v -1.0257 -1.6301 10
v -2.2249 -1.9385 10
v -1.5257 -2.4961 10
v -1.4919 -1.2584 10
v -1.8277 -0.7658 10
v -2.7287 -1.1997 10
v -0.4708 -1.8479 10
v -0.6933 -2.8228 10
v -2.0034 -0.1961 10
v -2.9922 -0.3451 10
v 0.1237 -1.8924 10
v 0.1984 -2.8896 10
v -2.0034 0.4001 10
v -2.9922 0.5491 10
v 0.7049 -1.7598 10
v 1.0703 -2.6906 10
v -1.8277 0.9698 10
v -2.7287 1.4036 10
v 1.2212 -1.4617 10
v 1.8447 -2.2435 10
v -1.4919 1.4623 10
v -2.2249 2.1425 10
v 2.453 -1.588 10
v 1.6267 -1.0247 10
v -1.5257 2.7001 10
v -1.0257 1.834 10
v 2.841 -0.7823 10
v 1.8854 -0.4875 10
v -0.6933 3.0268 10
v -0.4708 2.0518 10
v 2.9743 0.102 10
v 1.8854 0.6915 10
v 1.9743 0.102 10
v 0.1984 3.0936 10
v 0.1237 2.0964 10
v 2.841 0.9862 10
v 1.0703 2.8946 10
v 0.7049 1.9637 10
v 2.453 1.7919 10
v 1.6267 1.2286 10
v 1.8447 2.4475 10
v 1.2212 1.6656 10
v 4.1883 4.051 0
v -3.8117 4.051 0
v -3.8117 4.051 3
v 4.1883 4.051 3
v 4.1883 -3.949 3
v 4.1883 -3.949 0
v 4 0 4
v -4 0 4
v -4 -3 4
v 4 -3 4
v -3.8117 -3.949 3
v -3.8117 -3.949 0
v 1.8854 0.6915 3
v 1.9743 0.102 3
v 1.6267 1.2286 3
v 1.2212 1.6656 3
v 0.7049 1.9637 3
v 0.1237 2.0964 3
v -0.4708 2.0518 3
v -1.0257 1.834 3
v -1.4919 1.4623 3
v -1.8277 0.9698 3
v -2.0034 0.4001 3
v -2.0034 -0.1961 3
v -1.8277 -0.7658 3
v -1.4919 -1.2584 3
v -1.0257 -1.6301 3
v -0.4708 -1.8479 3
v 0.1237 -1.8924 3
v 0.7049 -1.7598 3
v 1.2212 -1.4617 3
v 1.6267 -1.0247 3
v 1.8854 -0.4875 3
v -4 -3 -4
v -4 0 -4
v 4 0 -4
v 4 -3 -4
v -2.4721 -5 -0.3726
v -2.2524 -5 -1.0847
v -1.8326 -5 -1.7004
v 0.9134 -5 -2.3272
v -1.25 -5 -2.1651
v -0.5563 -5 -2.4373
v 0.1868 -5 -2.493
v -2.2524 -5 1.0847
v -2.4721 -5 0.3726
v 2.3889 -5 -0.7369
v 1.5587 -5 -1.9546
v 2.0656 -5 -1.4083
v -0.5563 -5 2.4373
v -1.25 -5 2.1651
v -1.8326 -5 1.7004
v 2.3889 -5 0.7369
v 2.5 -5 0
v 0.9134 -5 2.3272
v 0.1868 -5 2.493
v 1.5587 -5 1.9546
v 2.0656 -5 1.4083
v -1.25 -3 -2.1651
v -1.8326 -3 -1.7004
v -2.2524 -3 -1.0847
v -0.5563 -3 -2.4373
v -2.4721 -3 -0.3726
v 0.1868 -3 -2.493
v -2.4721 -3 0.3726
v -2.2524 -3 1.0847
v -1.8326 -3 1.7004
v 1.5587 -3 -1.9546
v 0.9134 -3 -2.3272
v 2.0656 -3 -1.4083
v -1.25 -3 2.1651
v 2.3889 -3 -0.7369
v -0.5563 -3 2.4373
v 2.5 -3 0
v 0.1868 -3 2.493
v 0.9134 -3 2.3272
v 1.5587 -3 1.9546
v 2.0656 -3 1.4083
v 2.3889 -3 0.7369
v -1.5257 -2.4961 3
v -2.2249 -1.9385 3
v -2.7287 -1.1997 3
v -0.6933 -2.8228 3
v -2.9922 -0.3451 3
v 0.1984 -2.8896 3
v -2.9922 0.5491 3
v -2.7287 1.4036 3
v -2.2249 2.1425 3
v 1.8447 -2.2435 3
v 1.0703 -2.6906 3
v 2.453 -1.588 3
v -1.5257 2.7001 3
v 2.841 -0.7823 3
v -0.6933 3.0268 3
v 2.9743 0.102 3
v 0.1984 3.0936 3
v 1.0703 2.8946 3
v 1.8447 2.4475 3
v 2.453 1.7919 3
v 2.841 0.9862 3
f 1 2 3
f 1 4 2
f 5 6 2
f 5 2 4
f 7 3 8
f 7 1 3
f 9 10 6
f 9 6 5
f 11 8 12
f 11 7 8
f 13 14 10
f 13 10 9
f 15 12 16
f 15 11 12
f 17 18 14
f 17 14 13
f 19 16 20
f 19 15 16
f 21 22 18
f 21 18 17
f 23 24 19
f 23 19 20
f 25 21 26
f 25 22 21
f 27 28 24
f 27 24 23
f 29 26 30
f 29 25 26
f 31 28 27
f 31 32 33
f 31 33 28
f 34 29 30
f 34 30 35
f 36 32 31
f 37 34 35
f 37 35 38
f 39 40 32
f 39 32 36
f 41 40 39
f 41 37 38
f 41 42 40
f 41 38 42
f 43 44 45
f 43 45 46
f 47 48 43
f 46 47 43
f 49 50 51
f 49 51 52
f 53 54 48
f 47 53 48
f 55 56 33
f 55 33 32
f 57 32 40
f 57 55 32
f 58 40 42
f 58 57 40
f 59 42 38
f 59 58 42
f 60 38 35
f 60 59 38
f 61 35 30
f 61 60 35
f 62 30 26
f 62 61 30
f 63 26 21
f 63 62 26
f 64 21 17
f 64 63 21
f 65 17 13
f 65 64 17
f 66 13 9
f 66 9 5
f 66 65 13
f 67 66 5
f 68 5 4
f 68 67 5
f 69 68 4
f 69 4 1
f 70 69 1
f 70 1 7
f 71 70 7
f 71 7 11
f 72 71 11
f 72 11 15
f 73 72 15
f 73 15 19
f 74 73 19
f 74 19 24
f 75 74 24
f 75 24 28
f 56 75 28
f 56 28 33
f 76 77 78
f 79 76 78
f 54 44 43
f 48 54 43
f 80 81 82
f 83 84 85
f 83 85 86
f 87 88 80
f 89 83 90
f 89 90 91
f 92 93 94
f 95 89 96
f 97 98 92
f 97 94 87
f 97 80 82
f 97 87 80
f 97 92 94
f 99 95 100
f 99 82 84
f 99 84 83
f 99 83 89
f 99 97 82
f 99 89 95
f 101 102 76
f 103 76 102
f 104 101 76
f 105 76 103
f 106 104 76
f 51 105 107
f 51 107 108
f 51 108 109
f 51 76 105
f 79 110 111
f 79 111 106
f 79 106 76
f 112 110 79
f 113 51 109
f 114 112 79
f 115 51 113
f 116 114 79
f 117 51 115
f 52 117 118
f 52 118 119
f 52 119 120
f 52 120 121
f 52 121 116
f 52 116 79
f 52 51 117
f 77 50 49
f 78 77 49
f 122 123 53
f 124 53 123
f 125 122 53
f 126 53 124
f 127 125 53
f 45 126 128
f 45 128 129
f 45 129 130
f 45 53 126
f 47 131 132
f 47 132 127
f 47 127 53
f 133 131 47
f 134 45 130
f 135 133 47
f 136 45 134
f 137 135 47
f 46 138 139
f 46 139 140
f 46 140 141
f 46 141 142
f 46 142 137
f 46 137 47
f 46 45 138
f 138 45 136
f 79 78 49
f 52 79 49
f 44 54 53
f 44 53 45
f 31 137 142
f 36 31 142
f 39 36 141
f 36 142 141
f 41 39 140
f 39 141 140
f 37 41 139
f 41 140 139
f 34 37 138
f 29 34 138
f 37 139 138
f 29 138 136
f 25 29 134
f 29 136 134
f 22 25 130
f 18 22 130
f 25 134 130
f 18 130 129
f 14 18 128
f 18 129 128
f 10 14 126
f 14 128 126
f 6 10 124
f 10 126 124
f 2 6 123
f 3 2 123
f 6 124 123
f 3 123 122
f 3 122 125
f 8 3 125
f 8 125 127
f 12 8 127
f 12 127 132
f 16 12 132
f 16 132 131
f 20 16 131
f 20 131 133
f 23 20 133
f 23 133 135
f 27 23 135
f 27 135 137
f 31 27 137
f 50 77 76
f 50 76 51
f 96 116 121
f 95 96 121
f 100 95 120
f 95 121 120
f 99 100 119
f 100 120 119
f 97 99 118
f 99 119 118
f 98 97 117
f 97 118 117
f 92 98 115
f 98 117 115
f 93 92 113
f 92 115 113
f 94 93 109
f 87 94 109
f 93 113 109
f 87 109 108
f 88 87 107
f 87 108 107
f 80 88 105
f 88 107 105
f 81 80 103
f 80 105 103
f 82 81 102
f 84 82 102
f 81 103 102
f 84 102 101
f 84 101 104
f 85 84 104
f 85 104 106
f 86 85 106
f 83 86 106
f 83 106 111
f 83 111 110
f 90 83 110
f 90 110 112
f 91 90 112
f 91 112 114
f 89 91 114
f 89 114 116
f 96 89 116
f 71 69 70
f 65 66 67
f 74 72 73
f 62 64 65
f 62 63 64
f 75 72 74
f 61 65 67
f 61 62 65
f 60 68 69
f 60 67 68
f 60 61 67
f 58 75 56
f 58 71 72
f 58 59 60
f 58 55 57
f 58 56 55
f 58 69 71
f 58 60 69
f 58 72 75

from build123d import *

# Parameters (mm, degrees)
F0_W     = 8
F0_H     = 8
F1_DEPTH = 3
F2_R     = 2.5
F3_DEPTH = 5
F4_W     = 8
F4_H     = 8
F5_DEPTH = 3
F6_R     = 3
F6_R_2   = 2
F7_DEPTH = 10


with BuildPart() as f1:
    # F0 (on Front) → F1 (new body)
    with BuildSketch(Plane.XZ):
        Rectangle(F0_W, F0_H)
    extrude(amount=F1_DEPTH)

    # F2 (on Front) → F3 (join)
    with BuildSketch(Plane.XZ):
        Circle(F2_R)
    extrude(amount=F3_DEPTH)


with BuildPart() as f5:
    # F4 (on Top) → F5 (new body)
    with BuildSketch(Plane.XY):
        with Locations((0.1882740475, 0.0510183199)):
            Rectangle(F4_W, F4_H)
    extrude(amount=F5_DEPTH)

    # F6 (on Top) → F7 (join)
    with BuildSketch(Plane.XY):
        with Locations((-0.0257475294, 0.1019836782)):
            Circle(F6_R)
        with Locations((-0.0257475294, 0.1019836782)):
            Circle(F6_R_2, mode=Mode.SUBTRACT)
    extrude(amount=F7_DEPTH)


solid = Compound([f1.part, f5.part])
